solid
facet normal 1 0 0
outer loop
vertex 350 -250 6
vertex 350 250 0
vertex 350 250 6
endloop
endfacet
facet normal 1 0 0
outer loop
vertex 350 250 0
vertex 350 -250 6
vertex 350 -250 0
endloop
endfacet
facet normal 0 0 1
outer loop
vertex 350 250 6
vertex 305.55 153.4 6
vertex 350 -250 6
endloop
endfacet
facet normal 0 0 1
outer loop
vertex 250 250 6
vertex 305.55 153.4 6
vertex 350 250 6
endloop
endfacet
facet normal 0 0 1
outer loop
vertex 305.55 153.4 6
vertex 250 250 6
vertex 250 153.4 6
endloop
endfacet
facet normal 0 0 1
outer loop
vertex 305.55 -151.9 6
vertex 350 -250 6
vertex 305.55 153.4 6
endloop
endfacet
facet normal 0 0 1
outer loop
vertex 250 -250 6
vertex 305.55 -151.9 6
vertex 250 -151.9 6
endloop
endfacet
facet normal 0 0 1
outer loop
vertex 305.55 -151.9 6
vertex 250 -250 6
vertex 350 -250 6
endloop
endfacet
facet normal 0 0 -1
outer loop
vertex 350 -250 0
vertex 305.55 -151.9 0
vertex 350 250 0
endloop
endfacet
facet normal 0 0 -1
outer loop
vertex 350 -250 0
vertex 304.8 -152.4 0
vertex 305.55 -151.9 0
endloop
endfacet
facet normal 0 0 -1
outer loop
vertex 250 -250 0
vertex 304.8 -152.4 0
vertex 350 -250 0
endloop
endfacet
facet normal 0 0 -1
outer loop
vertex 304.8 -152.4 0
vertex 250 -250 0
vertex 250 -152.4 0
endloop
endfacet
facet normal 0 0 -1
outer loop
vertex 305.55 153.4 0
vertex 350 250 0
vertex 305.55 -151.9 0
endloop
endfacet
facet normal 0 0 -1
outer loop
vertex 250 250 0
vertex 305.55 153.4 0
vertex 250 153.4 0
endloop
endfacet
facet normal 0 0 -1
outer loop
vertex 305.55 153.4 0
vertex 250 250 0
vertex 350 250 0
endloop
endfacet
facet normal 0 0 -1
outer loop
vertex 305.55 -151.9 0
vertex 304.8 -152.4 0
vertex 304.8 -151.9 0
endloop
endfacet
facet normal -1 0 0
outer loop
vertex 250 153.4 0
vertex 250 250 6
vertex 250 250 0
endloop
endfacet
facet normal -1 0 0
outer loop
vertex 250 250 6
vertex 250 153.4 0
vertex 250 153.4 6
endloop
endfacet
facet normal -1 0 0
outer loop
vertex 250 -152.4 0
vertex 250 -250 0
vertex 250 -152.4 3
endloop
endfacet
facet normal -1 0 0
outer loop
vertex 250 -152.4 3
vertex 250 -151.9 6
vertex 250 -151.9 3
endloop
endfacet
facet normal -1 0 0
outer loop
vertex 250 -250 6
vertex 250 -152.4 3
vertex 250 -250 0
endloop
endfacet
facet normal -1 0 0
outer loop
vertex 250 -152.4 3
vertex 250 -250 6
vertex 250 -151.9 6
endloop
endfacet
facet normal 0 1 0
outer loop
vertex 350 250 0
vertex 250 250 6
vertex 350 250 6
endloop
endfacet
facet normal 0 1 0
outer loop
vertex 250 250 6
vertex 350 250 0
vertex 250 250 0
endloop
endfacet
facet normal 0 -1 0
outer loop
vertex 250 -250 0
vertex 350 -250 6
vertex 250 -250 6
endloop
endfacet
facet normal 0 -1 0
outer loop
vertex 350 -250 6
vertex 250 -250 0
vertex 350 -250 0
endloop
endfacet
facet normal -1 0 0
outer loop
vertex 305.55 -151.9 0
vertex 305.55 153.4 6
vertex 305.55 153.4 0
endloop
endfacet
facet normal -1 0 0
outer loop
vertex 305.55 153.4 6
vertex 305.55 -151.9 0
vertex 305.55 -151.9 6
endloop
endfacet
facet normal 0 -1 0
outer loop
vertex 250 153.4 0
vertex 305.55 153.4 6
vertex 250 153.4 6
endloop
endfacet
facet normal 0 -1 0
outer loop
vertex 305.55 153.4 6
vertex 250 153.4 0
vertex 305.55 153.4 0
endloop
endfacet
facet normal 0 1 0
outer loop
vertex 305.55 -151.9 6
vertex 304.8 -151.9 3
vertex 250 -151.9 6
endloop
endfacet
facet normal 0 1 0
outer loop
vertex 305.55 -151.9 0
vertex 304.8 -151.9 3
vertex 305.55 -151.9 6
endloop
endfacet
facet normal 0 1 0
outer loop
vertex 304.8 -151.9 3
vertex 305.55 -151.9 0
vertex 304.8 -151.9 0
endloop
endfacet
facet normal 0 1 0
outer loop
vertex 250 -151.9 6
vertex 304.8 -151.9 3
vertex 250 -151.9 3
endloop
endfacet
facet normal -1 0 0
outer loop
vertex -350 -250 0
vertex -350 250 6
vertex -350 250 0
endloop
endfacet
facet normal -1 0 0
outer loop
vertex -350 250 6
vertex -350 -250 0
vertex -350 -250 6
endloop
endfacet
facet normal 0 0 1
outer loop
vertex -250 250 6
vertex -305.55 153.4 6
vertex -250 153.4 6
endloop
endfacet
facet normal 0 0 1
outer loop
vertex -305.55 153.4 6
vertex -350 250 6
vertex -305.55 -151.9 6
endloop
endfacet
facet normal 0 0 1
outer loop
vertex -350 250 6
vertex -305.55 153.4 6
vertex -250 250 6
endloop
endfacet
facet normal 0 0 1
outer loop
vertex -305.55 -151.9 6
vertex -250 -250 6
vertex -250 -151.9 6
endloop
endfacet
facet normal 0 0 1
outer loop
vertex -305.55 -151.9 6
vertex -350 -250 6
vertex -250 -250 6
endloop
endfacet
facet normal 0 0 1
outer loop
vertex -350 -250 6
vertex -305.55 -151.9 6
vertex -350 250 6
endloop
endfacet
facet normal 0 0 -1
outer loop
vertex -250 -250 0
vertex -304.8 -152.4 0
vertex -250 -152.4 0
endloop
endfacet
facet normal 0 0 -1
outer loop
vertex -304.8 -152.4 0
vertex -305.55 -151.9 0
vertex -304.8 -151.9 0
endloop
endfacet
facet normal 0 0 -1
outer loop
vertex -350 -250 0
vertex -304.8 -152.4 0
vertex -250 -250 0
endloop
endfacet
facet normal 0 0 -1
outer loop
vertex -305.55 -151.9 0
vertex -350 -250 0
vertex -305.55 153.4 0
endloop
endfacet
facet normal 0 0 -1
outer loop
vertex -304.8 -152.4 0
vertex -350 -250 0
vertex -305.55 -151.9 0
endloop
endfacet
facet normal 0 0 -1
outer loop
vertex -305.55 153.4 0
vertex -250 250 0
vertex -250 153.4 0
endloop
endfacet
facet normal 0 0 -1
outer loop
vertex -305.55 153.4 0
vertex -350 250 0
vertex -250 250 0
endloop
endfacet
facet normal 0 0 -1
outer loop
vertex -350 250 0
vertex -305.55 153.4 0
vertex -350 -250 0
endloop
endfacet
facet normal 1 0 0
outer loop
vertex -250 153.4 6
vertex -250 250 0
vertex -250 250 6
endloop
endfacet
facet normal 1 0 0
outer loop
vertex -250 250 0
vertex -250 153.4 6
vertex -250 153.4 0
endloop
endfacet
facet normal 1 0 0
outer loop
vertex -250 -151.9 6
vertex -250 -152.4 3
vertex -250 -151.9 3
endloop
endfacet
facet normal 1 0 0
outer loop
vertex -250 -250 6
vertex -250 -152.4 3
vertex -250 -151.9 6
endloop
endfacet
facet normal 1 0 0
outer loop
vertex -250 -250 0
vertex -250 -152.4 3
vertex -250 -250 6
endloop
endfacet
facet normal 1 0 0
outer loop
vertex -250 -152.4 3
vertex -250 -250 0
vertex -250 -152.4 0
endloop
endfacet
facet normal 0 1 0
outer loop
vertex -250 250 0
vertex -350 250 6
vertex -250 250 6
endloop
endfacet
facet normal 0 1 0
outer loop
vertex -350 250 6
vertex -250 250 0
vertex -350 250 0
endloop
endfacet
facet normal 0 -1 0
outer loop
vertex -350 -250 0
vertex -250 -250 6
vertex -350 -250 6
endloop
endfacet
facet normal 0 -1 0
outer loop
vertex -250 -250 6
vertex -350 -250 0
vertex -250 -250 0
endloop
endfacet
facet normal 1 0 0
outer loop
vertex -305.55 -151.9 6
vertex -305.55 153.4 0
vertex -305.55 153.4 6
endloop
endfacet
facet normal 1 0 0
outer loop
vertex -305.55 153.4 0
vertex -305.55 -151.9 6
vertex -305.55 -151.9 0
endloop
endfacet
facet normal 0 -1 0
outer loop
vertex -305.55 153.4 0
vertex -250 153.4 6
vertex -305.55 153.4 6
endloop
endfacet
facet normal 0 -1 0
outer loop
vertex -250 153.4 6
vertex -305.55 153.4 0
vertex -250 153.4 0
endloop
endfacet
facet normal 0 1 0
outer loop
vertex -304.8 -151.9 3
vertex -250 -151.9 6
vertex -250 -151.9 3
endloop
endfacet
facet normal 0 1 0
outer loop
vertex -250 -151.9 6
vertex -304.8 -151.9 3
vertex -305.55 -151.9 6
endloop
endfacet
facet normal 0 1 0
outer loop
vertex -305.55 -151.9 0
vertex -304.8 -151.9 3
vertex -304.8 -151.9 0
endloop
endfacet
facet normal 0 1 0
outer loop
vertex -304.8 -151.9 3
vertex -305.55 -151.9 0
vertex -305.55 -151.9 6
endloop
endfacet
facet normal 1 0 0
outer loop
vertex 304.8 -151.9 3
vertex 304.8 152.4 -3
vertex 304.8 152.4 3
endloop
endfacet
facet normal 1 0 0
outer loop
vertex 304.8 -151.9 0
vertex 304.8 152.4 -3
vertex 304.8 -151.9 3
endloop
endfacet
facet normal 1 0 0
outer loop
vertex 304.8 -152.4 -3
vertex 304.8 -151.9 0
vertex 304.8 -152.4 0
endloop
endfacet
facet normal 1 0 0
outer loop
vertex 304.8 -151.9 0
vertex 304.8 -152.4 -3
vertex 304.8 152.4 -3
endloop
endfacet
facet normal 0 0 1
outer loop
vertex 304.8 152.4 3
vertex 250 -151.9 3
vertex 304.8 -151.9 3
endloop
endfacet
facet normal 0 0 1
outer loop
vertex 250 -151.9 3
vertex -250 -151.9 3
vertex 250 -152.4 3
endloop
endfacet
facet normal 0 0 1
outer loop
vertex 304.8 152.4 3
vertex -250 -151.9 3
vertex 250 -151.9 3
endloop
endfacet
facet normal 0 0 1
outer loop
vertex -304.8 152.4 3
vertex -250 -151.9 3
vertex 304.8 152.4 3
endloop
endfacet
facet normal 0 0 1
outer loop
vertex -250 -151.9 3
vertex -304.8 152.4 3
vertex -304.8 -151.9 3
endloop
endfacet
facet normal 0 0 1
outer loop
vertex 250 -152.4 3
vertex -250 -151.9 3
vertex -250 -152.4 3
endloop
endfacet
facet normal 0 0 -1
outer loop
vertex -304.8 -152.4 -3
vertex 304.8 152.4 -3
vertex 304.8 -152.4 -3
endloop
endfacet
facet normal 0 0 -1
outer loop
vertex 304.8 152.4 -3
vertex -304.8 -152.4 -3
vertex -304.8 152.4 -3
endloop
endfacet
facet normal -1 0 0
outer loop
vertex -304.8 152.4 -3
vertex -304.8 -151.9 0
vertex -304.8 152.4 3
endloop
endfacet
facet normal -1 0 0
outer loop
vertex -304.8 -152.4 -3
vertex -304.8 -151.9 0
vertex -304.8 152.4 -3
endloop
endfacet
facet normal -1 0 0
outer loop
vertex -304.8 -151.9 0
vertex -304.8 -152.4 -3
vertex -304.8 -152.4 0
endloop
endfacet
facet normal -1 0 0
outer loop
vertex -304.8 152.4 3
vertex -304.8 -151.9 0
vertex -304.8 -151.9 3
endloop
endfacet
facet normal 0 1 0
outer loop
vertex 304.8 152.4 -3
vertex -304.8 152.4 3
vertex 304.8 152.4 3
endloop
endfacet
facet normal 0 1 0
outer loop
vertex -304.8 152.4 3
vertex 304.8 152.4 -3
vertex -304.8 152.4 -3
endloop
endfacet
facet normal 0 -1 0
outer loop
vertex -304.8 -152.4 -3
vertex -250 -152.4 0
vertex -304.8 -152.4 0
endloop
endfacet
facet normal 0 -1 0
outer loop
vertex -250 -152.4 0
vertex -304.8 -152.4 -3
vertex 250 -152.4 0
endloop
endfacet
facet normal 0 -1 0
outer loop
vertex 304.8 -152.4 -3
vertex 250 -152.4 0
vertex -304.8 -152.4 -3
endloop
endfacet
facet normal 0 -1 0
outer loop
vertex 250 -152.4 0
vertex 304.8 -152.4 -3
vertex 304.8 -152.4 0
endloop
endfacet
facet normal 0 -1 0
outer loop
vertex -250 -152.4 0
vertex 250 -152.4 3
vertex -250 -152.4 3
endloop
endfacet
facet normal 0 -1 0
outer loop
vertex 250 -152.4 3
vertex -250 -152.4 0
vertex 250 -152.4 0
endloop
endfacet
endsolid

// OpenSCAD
jib_width=100;
bed_width=700;
bed_depth=500;
sheet_width=24*25.4;
sheet_depth=12*25.4;
slop=0.5;

model_layout();
//cut_layout();

module model_layout(){
  %translate([0,0,0]) cube([bed_width,bed_depth,1], center=true);
  translate([0,0,0]) color("green") cube([sheet_width,sheet_depth,6], center=true);
  
  translate([bed_width/2-jib_width,-bed_depth/2,0]) alignment_jig();

  mirror([1,0,0]) translate([bed_width/2-jib_width,-bed_depth/2,0]) alignment_jig();
}

module alignment_jig(width=jib_width){
  difference(){
    cube([width,bed_depth,6]);
    translate([slop/2-(bed_width-sheet_width)/2,((bed_depth-sheet_depth)/2)+slop,-1]) cube([width+slop,sheet_depth+slop,6+2]);
  }
}

module cut_layout(){
  %cube([sheet_width,sheet_depth,6], center=true);
  translate([200,50,0]) rotate([0,0,90]) alignment_jig();
  translate([-200,105,0]) rotate([0,0,270]) alignment_jig();
}
